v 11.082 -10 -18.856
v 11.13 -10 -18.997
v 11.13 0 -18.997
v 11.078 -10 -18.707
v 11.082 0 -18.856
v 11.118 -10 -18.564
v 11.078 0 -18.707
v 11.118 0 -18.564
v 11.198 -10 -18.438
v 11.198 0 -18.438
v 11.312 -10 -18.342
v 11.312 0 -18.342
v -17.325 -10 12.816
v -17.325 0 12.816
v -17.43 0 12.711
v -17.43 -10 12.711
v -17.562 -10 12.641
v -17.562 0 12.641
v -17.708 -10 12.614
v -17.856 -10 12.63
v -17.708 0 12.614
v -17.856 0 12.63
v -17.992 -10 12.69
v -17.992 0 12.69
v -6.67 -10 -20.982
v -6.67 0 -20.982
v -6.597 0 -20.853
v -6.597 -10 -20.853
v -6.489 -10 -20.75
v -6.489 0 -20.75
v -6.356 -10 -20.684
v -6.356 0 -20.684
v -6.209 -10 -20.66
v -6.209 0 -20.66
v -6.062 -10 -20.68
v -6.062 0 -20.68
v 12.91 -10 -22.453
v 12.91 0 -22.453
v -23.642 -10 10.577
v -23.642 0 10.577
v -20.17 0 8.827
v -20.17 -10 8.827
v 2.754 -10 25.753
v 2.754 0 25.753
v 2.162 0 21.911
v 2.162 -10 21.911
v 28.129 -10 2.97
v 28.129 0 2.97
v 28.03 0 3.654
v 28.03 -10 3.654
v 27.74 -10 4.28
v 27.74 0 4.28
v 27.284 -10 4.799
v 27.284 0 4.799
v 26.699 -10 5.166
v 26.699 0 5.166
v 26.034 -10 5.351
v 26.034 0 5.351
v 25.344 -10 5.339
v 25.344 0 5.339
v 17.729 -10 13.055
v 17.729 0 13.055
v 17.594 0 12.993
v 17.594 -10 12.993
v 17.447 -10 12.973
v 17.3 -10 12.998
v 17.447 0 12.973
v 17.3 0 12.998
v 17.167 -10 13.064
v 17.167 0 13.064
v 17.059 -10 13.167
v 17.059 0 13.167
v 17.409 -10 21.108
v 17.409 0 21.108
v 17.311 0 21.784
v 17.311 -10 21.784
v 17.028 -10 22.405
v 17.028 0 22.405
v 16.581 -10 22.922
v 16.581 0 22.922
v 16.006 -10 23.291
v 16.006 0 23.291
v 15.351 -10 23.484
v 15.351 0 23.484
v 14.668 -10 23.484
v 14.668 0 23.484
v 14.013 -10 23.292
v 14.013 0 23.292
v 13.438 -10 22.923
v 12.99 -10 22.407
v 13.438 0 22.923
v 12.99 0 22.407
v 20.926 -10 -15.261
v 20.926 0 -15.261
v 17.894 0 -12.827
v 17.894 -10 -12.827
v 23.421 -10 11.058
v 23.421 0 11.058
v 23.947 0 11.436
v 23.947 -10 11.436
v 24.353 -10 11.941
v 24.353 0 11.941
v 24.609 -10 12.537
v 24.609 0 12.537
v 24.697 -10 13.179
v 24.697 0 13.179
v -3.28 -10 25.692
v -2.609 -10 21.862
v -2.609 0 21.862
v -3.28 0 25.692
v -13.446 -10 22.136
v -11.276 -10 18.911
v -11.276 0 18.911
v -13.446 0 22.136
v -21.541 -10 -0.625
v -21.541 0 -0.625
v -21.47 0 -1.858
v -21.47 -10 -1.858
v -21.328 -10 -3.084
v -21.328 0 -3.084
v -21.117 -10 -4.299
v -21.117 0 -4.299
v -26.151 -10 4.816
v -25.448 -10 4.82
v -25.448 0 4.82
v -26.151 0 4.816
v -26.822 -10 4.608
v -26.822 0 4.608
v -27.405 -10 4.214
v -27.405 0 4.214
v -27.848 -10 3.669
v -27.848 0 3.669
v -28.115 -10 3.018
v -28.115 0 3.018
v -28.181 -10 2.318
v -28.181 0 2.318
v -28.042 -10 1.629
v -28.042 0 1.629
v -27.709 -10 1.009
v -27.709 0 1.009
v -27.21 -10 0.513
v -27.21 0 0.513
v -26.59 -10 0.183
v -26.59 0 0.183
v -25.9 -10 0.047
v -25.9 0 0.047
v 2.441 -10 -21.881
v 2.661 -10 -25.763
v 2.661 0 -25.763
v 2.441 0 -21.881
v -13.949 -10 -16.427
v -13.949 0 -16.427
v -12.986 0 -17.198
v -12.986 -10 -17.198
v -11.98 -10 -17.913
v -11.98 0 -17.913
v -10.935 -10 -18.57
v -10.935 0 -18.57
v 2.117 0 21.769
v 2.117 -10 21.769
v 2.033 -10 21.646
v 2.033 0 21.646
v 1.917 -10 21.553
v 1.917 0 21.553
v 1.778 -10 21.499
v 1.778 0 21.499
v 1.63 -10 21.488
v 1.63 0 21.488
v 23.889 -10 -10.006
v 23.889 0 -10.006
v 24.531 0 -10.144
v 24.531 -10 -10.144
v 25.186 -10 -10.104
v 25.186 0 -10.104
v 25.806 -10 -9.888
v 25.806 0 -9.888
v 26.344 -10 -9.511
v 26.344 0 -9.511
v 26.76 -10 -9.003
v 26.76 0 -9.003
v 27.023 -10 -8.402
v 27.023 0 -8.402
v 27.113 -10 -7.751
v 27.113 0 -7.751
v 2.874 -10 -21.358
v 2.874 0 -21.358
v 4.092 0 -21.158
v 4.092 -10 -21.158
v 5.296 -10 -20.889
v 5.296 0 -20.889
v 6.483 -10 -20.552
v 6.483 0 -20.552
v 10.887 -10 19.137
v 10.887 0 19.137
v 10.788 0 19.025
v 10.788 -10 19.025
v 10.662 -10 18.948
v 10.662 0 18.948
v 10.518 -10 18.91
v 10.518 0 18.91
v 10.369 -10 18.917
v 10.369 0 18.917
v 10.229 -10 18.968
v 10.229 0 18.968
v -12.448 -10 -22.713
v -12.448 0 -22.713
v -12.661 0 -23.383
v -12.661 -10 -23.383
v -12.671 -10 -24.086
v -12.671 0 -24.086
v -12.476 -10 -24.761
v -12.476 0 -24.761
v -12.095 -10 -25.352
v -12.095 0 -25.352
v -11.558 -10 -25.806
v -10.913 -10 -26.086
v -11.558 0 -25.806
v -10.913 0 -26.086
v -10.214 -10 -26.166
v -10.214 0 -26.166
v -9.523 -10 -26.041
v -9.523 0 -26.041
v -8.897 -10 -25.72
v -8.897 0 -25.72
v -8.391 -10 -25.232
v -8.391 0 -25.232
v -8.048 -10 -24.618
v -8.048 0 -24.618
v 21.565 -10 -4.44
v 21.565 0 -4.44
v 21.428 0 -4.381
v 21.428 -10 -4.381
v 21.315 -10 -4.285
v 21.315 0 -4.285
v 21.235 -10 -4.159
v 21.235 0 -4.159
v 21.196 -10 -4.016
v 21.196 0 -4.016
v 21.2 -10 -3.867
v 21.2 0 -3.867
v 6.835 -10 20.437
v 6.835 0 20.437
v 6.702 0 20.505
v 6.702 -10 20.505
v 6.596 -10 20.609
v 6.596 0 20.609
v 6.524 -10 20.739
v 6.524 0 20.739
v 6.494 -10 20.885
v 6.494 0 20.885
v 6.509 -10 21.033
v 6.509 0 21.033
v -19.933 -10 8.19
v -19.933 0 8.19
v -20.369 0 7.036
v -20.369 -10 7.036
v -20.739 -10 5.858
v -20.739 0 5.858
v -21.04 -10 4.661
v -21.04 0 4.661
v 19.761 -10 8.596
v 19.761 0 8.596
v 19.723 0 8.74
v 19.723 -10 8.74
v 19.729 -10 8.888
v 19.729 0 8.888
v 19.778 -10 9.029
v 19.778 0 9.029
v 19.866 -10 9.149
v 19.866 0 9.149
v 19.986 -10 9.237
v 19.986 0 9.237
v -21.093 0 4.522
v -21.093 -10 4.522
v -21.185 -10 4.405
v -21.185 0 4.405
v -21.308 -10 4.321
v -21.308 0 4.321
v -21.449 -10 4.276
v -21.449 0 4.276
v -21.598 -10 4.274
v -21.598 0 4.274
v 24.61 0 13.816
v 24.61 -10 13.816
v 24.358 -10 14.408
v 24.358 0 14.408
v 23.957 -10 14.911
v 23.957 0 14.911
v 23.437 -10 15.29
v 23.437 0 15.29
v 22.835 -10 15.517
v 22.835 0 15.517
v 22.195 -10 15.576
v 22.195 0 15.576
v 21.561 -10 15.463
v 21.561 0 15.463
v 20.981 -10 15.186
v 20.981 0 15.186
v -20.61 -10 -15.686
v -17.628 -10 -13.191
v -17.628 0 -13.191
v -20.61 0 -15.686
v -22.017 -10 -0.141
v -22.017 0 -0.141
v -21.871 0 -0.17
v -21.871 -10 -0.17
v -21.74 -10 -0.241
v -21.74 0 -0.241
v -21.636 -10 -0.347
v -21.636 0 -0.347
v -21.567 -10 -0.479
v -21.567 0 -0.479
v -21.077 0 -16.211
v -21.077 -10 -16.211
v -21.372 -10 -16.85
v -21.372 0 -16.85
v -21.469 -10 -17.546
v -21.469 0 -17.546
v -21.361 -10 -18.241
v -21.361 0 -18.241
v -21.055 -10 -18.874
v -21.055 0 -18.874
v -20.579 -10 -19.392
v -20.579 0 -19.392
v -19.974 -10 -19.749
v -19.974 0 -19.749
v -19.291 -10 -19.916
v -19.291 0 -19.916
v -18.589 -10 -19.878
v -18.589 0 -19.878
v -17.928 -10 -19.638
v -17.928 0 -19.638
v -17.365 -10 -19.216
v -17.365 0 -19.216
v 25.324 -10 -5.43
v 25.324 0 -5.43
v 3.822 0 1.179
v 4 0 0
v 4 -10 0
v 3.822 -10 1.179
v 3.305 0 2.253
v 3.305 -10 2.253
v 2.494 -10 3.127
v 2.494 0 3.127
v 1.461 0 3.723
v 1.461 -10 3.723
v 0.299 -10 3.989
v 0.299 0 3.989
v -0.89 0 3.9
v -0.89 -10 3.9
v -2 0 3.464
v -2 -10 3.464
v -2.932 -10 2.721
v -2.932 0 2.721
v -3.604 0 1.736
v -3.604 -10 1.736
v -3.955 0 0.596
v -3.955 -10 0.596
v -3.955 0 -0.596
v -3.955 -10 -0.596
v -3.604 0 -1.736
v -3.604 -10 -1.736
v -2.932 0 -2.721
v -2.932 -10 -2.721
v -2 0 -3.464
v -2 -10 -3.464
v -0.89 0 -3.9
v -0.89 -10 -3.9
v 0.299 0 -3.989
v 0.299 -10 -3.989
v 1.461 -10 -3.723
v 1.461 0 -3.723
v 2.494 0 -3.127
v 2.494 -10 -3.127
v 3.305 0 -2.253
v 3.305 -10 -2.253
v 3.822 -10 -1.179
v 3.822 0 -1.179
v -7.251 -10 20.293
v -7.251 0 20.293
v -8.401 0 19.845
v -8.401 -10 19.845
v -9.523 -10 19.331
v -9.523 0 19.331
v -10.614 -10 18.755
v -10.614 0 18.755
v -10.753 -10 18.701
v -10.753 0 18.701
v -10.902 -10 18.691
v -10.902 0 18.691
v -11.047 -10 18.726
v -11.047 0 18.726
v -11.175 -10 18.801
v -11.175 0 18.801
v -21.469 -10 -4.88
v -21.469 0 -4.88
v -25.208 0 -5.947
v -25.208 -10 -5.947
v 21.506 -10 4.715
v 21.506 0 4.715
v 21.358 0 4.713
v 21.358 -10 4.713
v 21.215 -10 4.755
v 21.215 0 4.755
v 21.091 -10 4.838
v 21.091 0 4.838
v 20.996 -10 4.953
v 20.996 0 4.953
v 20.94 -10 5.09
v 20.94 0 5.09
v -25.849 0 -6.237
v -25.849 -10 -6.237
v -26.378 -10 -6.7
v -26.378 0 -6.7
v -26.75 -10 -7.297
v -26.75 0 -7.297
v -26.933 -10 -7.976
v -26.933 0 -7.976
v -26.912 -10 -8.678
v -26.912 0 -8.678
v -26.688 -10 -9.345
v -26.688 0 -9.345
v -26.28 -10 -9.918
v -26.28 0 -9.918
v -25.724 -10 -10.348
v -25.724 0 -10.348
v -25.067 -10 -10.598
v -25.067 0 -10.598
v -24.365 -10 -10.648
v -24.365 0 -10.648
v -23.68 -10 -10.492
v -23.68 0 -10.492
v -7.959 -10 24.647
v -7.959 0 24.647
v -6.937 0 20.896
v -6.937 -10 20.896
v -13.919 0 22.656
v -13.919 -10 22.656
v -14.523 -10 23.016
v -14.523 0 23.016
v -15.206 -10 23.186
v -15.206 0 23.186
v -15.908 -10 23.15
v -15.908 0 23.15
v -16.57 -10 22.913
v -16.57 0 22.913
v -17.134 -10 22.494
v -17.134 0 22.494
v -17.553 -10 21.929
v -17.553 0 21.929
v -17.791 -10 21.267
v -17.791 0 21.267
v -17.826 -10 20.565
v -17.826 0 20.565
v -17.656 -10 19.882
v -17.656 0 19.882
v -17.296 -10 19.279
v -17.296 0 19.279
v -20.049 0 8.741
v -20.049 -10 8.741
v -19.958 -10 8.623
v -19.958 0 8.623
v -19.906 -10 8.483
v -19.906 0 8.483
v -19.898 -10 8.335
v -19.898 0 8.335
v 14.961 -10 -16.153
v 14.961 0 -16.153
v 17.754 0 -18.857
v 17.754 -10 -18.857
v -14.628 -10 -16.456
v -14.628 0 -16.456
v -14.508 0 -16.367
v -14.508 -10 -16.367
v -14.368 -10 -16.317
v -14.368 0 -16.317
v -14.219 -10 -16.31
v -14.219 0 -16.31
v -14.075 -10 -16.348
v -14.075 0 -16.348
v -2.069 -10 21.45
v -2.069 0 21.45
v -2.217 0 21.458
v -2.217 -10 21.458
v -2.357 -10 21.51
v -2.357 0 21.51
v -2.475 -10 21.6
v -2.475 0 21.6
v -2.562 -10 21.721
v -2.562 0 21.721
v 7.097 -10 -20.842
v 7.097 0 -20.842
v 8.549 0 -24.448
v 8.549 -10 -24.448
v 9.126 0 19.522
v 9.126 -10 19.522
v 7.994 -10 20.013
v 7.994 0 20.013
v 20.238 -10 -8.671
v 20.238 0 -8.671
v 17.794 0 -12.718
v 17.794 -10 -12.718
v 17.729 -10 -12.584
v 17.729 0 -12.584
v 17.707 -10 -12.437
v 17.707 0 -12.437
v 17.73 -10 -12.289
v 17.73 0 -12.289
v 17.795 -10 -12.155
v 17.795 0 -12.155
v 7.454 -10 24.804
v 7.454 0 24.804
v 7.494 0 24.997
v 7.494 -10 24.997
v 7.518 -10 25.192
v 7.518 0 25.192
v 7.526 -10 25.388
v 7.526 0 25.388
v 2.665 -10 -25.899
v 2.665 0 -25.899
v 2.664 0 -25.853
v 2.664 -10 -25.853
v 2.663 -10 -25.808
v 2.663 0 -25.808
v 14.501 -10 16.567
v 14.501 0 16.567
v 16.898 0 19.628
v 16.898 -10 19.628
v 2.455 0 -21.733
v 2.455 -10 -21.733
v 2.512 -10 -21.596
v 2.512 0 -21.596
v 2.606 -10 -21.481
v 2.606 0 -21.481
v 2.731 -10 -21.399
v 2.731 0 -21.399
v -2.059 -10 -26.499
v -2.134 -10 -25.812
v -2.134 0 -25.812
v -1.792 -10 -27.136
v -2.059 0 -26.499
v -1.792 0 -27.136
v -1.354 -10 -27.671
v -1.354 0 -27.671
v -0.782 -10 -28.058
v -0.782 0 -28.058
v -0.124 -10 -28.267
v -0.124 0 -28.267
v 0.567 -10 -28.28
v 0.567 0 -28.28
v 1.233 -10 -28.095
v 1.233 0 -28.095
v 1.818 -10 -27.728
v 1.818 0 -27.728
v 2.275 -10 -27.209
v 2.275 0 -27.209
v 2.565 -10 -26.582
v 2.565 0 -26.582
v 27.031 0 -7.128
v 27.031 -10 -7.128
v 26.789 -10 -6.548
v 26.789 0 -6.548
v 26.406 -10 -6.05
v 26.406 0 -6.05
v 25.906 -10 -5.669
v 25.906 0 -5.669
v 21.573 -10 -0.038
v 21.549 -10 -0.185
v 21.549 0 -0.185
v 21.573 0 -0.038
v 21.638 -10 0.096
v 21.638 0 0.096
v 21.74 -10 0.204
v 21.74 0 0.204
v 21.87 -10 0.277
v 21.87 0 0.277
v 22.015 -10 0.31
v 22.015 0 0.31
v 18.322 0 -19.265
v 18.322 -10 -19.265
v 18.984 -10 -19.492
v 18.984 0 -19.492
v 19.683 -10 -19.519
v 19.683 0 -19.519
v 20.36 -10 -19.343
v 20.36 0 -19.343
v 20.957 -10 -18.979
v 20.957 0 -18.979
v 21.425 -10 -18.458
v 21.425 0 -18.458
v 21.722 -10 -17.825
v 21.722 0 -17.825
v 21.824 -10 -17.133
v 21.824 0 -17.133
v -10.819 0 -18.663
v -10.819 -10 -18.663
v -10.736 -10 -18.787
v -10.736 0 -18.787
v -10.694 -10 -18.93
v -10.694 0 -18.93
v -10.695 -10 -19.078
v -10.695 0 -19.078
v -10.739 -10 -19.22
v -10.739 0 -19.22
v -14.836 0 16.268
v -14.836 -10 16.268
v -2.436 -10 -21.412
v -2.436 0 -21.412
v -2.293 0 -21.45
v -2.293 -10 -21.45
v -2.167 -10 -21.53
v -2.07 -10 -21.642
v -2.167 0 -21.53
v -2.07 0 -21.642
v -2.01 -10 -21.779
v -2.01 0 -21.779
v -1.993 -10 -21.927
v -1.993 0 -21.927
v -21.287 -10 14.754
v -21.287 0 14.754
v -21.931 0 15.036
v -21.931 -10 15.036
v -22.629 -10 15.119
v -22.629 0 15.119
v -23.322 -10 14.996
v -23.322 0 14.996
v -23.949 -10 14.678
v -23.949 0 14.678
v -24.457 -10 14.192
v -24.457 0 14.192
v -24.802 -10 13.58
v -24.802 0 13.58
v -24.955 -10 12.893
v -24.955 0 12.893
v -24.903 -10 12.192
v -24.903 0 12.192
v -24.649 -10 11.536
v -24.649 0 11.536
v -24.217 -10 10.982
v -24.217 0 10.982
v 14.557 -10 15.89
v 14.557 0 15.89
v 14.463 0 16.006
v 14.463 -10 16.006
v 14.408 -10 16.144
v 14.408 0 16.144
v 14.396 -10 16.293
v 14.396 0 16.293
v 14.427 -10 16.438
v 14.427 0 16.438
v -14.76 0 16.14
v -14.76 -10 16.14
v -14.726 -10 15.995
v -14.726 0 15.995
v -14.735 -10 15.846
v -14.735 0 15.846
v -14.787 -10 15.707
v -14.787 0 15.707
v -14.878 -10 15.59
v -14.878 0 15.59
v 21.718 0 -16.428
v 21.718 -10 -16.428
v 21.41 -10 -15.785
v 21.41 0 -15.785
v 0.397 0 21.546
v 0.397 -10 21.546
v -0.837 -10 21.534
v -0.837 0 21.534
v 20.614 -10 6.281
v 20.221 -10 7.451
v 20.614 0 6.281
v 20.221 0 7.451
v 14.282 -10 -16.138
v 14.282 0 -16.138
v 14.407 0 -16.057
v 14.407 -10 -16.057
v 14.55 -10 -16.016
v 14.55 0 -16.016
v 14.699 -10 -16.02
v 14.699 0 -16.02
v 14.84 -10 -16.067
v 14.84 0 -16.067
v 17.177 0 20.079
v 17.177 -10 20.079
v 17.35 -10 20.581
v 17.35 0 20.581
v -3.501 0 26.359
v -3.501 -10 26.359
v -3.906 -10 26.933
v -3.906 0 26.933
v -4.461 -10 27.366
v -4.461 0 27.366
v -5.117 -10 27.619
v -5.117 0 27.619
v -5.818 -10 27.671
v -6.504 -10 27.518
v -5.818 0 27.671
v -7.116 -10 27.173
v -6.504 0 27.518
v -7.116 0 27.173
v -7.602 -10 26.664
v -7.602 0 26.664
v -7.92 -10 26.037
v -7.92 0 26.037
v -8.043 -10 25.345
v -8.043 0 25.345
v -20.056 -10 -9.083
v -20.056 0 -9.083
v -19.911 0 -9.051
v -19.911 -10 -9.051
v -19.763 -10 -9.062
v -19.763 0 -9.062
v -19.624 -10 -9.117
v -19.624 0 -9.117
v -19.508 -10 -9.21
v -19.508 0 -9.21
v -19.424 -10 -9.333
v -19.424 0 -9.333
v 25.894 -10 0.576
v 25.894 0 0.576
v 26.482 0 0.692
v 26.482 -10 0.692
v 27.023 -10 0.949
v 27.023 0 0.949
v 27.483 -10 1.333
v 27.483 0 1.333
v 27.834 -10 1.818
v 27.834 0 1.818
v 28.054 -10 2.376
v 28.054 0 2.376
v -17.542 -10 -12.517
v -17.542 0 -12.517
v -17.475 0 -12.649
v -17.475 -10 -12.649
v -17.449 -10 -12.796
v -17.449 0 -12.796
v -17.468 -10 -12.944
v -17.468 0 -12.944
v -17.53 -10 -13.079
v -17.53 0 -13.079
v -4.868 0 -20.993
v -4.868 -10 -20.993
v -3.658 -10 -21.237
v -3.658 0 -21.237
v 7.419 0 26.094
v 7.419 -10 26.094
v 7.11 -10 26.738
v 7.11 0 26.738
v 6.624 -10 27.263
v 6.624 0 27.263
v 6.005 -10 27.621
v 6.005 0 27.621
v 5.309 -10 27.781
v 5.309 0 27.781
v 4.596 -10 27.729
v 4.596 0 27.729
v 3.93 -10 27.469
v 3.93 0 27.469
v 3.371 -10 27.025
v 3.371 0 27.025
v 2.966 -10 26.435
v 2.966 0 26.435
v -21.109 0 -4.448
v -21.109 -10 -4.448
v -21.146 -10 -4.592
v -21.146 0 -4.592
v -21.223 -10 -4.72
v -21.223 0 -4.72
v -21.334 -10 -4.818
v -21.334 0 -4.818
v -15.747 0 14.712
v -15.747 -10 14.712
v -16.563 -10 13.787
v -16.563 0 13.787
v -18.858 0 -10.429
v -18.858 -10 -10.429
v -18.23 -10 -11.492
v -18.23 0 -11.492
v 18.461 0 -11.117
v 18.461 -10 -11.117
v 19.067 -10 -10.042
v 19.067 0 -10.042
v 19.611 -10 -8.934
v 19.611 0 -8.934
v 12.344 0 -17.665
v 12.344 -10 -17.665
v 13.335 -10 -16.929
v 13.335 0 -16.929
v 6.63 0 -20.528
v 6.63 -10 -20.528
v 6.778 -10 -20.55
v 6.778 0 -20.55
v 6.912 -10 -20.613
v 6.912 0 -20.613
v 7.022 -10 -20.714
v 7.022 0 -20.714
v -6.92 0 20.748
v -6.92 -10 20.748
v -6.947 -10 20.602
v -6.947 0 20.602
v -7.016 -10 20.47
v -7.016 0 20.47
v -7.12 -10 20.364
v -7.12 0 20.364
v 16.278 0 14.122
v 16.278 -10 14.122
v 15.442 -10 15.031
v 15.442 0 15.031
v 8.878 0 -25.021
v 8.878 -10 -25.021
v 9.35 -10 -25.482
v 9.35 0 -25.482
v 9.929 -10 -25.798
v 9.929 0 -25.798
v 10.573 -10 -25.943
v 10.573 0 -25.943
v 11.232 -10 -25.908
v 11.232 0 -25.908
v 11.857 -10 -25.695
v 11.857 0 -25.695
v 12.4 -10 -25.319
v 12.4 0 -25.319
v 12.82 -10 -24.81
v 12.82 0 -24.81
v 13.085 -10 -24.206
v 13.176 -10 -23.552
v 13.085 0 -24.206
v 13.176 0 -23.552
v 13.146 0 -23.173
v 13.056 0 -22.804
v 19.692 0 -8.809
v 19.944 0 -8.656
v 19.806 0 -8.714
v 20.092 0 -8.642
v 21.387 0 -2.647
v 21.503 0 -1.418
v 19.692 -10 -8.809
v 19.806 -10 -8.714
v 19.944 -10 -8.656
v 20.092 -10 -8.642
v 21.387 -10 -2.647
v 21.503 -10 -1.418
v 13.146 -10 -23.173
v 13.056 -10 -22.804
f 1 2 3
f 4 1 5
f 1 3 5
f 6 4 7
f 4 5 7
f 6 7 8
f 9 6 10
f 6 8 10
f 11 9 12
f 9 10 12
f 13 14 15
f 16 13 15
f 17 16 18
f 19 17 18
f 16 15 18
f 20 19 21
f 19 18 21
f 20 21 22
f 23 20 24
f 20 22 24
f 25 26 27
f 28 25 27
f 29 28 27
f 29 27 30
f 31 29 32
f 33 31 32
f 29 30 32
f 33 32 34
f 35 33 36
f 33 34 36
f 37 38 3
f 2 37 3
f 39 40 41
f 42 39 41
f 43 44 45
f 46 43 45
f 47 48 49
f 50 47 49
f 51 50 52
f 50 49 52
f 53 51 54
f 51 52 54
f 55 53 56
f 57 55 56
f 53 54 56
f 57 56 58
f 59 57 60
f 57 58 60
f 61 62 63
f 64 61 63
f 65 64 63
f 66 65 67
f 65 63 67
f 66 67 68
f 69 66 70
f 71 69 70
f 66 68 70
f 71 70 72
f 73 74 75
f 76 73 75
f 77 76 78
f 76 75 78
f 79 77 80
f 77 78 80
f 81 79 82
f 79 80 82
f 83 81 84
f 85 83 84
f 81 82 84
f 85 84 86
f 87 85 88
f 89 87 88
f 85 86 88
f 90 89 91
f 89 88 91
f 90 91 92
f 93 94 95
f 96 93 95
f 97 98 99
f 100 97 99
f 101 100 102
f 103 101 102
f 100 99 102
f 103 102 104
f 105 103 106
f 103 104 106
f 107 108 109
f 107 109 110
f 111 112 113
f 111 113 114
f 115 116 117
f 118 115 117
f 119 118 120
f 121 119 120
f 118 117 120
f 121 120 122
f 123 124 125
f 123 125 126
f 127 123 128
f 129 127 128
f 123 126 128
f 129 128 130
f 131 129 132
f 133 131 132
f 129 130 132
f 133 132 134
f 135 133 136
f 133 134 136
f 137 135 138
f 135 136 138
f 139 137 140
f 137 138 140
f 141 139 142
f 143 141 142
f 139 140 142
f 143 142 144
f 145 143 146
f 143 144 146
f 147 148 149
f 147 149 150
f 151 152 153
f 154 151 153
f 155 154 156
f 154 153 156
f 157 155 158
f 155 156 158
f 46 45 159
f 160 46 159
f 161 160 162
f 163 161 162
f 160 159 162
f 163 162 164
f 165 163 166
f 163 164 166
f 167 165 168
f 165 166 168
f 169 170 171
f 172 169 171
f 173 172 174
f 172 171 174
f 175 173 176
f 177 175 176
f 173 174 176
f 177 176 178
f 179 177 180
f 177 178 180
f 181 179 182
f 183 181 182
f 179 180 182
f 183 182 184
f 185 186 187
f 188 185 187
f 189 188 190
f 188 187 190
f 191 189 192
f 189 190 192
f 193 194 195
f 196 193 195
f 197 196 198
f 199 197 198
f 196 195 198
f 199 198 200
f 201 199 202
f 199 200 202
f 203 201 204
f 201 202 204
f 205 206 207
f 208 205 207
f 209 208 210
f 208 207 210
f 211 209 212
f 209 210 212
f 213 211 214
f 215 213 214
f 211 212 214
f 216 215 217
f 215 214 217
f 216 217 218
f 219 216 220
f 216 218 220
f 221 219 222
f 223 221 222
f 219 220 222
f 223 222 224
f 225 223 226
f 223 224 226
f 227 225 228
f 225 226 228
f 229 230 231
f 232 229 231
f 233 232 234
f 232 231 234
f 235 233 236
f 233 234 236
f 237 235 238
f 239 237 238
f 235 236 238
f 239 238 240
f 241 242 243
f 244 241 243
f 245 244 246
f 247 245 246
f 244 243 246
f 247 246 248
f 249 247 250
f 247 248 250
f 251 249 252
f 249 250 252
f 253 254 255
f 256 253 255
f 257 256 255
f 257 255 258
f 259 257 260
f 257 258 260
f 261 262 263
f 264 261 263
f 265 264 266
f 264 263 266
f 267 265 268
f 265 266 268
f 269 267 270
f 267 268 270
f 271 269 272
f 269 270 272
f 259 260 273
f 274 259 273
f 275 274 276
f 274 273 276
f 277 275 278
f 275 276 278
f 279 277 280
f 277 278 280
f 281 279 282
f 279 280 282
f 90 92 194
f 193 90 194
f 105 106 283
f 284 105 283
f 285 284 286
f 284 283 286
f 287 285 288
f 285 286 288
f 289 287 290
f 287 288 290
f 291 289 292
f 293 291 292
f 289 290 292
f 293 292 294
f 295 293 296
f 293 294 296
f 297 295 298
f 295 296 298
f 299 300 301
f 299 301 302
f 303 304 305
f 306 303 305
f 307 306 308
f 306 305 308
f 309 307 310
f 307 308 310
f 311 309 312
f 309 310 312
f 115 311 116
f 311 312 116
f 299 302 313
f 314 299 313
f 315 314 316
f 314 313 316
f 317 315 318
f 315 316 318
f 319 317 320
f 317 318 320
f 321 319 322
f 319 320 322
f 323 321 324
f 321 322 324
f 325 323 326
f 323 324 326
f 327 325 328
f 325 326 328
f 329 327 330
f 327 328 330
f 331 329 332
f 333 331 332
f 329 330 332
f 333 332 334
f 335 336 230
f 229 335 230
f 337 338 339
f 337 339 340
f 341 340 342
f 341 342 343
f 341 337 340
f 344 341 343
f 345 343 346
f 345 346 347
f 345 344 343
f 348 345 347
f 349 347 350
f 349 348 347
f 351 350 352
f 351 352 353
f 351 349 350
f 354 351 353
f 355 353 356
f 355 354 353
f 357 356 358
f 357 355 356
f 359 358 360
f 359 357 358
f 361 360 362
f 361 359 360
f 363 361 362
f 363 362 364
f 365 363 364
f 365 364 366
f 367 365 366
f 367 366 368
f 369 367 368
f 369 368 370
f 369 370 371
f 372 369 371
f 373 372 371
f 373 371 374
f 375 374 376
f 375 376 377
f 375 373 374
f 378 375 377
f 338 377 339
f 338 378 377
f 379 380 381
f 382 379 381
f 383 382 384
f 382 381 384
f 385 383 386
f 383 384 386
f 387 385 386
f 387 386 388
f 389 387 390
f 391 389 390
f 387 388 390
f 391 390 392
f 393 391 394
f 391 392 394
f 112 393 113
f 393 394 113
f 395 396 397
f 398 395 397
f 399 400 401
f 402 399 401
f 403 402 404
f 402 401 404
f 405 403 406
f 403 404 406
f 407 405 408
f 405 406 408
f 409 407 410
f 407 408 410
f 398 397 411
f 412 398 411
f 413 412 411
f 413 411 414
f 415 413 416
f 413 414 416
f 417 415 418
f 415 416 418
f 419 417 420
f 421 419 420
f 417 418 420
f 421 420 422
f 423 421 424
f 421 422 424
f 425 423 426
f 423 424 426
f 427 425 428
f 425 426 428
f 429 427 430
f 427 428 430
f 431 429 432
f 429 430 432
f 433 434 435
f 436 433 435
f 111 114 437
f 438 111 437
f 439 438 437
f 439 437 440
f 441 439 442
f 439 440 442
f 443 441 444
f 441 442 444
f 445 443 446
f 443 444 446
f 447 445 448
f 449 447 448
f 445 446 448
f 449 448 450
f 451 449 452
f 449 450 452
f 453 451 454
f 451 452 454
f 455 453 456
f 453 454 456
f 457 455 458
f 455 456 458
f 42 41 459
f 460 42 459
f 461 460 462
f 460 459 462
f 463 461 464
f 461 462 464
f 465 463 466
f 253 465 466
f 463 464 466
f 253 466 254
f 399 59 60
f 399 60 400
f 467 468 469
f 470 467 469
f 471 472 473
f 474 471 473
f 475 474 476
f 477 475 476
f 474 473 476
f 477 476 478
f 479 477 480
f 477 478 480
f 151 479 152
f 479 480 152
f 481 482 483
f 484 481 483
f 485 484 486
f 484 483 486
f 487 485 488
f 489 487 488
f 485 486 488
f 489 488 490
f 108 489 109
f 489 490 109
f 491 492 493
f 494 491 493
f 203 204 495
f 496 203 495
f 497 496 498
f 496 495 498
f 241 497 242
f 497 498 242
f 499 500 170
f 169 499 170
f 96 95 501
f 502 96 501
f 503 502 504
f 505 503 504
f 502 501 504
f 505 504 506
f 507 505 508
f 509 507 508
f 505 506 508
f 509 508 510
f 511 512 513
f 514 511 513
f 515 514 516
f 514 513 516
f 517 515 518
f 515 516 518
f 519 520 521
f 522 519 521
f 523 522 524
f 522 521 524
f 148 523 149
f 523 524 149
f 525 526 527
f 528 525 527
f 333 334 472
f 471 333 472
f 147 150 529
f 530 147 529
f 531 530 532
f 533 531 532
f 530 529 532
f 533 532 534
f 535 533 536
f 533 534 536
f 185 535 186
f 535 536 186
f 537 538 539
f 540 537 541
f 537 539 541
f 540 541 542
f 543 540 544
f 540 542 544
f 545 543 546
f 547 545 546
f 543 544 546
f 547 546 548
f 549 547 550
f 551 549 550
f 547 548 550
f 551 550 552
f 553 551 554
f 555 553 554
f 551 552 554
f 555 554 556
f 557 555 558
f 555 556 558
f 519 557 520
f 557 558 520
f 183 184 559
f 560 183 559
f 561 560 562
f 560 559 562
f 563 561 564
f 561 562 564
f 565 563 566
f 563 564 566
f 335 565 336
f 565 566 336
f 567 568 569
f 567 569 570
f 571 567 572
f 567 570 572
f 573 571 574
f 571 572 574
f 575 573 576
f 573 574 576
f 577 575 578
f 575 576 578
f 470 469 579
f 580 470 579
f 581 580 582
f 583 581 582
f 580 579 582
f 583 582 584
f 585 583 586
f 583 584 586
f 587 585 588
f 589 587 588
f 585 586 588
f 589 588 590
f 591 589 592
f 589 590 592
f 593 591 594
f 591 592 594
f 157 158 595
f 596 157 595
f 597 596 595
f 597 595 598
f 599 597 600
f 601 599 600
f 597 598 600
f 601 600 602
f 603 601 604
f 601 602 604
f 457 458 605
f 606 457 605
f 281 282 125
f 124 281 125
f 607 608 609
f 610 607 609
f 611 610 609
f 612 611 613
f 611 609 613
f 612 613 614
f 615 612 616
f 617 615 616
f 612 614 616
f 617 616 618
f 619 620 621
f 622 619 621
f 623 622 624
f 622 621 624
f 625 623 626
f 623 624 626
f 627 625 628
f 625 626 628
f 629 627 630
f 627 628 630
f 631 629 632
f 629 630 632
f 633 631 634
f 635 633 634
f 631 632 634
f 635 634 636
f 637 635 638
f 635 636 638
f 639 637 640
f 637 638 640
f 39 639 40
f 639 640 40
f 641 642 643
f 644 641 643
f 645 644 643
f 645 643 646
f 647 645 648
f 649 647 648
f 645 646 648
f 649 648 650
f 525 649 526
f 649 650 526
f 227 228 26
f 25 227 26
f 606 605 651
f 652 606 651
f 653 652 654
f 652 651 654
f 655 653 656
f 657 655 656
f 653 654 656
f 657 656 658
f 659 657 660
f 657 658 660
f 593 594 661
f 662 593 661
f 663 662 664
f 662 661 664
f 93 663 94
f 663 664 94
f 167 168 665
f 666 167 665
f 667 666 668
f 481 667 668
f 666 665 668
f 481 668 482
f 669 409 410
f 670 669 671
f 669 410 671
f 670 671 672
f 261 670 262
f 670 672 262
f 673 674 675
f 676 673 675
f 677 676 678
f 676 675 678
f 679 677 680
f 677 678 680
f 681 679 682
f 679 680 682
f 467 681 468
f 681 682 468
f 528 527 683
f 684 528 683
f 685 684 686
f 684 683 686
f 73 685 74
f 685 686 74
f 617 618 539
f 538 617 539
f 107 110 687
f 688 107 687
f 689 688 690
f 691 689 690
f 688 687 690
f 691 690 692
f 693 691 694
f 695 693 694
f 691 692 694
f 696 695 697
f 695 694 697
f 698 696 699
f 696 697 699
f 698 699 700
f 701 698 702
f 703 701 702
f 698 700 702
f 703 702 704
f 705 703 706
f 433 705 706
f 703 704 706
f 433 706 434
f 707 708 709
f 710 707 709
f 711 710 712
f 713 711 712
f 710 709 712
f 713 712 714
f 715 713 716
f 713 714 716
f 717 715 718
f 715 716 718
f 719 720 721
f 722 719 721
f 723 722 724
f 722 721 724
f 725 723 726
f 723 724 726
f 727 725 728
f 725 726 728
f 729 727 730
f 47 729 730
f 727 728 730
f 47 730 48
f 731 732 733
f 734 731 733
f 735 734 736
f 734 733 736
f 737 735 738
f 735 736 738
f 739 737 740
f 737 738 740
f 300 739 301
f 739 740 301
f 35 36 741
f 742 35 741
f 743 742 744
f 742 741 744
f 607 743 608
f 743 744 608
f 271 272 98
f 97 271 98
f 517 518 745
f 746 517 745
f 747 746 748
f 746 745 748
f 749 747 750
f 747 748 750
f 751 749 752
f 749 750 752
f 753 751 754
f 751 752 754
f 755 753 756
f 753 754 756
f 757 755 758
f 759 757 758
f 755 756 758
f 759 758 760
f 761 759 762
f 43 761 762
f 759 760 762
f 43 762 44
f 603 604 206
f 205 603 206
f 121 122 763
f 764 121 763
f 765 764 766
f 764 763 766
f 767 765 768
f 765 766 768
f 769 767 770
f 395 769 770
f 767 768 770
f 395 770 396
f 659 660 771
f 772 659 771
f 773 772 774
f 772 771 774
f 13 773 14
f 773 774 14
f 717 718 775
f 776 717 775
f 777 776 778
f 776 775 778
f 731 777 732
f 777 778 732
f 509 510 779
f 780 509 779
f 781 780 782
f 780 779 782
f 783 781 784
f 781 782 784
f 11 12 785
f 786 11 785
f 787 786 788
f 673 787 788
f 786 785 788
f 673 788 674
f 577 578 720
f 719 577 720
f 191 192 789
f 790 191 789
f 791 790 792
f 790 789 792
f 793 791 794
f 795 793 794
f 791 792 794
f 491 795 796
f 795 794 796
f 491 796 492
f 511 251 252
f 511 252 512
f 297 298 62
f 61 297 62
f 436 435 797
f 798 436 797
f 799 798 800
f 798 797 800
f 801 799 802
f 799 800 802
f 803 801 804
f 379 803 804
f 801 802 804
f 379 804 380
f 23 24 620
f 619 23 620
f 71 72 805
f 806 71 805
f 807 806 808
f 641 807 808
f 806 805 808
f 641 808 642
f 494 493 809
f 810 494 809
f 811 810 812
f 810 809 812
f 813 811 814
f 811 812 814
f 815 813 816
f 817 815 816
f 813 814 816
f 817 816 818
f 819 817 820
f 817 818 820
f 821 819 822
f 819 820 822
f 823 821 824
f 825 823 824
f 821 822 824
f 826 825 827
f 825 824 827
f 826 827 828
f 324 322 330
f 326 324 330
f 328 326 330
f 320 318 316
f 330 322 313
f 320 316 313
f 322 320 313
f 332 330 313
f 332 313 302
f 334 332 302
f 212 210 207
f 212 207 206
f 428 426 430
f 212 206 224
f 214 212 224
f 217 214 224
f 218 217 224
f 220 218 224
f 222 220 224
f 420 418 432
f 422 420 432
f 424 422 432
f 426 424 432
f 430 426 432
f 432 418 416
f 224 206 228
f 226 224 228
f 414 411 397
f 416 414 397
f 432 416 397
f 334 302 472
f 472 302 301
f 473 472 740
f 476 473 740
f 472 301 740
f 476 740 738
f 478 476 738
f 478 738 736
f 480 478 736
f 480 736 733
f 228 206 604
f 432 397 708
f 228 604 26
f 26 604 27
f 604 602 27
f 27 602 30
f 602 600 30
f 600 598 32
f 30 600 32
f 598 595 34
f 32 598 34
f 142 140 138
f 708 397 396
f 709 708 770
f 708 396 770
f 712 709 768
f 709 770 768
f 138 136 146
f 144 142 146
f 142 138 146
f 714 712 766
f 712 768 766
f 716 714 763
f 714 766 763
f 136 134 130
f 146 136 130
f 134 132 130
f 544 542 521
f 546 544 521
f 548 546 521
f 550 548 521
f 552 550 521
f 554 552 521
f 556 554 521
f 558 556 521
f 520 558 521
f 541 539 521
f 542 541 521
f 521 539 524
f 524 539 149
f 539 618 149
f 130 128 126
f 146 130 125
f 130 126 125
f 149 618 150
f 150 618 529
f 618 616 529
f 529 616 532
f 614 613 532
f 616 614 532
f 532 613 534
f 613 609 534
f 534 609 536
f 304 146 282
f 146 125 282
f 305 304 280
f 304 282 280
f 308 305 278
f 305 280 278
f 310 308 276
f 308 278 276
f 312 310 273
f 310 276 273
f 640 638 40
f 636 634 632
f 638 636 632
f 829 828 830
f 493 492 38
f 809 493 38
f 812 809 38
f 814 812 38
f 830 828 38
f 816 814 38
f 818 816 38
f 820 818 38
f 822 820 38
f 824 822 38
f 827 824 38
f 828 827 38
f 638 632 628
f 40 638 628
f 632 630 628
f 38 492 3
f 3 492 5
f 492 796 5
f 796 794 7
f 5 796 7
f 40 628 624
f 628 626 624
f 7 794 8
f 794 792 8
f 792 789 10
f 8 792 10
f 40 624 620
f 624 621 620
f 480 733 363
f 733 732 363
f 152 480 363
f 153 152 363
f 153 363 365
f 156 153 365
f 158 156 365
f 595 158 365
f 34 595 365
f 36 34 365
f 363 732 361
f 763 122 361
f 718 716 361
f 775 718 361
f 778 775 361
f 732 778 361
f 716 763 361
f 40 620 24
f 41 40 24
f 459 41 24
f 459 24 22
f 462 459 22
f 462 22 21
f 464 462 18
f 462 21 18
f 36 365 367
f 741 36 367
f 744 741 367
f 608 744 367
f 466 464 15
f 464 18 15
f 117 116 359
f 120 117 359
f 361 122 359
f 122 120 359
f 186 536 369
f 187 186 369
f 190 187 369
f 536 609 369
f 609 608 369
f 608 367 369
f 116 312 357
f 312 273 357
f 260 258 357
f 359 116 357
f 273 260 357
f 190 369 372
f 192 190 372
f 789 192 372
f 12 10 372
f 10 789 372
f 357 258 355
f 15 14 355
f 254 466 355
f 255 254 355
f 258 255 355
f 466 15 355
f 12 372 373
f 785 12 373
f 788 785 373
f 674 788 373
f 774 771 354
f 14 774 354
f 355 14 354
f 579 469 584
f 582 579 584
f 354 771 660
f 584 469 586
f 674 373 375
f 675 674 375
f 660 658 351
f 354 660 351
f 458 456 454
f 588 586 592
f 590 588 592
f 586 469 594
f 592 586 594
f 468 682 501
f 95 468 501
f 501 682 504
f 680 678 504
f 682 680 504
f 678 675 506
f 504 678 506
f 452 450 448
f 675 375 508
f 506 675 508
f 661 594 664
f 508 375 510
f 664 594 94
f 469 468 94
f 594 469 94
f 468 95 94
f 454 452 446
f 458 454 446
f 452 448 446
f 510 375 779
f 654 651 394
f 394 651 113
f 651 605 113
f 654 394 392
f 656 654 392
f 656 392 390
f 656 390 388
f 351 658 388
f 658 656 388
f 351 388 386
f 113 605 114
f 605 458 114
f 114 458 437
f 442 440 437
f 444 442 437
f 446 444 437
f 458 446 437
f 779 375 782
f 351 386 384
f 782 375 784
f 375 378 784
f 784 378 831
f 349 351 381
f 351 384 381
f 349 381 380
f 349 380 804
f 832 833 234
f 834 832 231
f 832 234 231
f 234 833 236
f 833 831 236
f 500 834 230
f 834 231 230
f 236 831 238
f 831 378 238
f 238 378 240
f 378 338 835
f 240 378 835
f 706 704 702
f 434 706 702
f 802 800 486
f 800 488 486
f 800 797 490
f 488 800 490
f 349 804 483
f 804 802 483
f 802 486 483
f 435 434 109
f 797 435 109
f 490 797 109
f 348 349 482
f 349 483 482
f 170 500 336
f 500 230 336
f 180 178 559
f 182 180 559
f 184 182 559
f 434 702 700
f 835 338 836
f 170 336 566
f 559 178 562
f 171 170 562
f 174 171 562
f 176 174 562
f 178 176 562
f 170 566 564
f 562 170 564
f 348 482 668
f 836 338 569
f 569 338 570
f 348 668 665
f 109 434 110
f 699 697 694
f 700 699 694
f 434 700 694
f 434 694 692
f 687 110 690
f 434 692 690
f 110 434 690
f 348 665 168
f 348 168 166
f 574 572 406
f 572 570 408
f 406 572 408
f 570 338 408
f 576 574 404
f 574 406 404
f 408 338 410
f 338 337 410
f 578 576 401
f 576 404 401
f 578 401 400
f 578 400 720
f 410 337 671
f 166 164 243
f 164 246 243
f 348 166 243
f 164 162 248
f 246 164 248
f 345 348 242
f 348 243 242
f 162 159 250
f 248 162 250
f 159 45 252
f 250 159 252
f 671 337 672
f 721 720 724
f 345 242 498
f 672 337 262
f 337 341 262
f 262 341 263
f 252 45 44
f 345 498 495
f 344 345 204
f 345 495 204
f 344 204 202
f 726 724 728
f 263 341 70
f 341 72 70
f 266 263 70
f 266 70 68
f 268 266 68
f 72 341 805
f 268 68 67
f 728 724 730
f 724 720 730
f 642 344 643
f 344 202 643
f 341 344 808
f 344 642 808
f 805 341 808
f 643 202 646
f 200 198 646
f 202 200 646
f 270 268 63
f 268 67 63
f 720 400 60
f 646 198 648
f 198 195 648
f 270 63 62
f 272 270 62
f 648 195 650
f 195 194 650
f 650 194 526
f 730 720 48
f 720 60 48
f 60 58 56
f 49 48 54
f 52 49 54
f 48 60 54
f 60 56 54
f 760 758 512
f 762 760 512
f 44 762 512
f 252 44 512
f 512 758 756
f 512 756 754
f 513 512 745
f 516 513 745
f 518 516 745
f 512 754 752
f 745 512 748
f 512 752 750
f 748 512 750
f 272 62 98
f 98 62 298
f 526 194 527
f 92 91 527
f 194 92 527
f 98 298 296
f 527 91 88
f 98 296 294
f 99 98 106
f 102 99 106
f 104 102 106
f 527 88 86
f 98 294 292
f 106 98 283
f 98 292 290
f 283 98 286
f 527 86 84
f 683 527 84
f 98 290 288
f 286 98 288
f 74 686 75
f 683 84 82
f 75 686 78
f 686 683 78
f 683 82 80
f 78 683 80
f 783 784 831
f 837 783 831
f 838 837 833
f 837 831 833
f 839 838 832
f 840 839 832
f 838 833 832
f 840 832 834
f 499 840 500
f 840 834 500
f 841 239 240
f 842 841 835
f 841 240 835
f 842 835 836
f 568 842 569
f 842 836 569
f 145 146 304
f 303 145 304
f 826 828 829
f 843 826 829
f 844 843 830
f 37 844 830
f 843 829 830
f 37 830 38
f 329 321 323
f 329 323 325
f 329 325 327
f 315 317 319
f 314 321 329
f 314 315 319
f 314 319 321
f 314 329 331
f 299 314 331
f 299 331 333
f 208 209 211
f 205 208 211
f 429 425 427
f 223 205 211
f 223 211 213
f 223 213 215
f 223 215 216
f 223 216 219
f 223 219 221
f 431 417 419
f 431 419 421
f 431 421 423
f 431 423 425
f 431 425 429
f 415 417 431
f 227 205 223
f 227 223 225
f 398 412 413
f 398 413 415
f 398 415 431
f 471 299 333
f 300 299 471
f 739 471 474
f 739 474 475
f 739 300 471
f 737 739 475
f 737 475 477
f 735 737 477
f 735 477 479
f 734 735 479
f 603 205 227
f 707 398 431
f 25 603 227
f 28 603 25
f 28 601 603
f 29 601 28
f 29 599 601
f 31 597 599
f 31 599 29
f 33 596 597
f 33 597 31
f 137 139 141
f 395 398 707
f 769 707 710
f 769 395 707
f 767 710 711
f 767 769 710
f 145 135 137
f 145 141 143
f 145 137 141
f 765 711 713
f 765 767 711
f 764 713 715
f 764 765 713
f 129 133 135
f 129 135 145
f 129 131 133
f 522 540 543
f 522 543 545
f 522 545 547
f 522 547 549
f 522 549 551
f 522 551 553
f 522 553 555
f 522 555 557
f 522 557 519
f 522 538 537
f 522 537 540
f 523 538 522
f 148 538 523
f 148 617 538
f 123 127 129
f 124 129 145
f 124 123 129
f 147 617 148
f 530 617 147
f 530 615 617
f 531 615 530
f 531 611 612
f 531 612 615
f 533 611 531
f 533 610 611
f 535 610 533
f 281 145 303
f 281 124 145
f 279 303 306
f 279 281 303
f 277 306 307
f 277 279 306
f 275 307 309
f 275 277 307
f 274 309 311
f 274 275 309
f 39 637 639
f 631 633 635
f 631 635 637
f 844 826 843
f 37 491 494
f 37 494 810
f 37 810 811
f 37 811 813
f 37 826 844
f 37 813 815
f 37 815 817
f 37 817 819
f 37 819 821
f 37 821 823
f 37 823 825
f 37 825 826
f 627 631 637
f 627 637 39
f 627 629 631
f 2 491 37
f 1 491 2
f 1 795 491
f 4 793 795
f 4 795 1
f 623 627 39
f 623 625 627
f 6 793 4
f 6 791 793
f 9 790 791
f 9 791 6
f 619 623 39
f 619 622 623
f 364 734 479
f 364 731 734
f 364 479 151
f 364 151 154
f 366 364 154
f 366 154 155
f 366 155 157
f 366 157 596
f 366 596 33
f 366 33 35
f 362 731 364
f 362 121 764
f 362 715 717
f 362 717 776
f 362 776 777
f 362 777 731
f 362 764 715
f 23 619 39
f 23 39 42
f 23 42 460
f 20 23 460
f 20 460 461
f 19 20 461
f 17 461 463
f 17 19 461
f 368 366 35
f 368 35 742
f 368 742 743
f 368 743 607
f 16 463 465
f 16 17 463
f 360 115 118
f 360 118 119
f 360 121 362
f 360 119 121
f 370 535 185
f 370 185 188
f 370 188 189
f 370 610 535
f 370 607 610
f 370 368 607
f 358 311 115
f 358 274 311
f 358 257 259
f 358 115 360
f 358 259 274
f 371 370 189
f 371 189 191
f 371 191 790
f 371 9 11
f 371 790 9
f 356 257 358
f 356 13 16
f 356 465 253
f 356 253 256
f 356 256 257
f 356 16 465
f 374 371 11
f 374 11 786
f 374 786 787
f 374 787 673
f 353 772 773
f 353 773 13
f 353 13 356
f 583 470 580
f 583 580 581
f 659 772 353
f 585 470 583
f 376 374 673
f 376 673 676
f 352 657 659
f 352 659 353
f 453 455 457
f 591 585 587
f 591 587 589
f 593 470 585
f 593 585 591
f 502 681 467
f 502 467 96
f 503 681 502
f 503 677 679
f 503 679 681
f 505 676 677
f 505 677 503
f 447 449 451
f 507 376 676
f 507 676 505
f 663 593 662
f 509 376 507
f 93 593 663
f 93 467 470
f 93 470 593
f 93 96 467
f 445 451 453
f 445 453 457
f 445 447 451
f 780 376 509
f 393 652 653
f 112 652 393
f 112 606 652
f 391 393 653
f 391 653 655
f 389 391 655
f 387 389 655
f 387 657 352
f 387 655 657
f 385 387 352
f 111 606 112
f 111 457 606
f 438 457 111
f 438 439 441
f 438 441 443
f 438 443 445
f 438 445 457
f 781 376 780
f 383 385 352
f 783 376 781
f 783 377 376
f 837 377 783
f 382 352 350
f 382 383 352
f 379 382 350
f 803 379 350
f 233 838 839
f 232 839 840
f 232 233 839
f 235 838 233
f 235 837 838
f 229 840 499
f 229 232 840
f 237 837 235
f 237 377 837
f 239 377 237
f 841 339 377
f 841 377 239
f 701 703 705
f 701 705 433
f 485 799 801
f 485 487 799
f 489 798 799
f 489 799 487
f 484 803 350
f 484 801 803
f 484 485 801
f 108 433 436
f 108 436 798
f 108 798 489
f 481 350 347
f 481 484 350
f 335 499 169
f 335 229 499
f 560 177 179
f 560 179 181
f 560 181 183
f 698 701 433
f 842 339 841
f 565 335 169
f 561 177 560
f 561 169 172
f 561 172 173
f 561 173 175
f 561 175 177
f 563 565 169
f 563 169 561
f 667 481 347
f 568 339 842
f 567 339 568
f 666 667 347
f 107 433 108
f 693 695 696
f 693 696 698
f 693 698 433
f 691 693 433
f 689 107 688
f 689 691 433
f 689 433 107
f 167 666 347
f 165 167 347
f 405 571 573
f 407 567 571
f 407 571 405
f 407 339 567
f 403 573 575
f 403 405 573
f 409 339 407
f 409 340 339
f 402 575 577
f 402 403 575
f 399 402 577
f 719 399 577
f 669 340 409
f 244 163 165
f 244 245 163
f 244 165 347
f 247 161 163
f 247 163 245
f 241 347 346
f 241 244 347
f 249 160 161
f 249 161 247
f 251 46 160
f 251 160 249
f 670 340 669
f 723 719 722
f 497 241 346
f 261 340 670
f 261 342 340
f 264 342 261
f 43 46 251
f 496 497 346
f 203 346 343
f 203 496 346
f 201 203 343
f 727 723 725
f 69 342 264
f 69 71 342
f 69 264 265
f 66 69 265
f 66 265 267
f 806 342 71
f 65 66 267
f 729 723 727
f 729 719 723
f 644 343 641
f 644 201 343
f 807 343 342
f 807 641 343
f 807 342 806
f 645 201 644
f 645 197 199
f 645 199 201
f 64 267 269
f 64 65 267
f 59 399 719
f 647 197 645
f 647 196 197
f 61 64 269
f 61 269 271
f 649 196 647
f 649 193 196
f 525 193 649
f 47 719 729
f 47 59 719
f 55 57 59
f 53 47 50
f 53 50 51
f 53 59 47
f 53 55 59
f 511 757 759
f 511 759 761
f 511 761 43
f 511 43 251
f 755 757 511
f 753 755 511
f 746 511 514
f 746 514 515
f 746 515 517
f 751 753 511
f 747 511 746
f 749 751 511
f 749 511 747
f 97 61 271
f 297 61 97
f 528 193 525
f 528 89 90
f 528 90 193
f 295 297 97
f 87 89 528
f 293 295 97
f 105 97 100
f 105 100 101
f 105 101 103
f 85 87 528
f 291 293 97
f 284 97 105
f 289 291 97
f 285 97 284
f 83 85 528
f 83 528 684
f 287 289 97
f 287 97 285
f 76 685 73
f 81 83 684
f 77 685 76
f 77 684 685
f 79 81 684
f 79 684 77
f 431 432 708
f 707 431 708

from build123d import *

# Parameters (mm, degrees)
F0_R     = 4
F1_DEPTH = 10


with BuildPart() as f1:
    # F0 (on Front) → F1 (new body)
    with BuildSketch(Plane.XZ):
        with BuildLine():
            ThreePointArc((21.549207, -0.184903), (21.549802, -0.092452), (21.55, 0))
            ThreePointArc((21.55, 0), (21.397, 2.563379), (20.940171, 5.090358))
            ThreePointArc((20.940171, 5.090358), (20.426122, 6.868482), (19.761387, 8.595935))
            ThreePointArc((19.761387, 8.595935), (18.551725, 10.965218), (17.059363, 13.167408))
            ThreePointArc((17.059363, 13.167408), (15.866528, 14.582722), (14.556643, 15.890457))
            ThreePointArc((14.556643, 15.890457), (12.487888, 17.562892), (10.228836, 18.967694))
            ThreePointArc((10.228836, 18.967694), (8.563467, 19.775478), (6.834924, 20.437375))
            ThreePointArc((6.834924, 20.437375), (4.264781, 21.123781), (1.62965, 21.488293))
            ThreePointArc((1.62965, 21.488293), (-0.220295, 21.548874), (-2.068616, 21.450486))
            ThreePointArc((-2.068616, 21.450486), (-4.695744, 21.032177), (-7.251317, 20.293371))
            ThreePointArc((-7.251317, 20.293371), (-8.965966, 19.596274), (-10.614473, 18.754612))
            ThreePointArc((-10.614473, 18.754612), (-12.844333, 17.303919), (-14.878465, 15.589541))
            ThreePointArc((-14.878465, 15.589541), (-16.161341, 14.2553), (-17.324991, 12.815895))
            ThreePointArc((-17.324991, 12.815895), (-18.77202, 10.583656), (-19.932992, 8.190137))
            ThreePointArc((-19.932992, 8.190137), (-20.562272, 6.449455), (-21.039861, 4.661194))
            ThreePointArc((-21.039861, 4.661194), (-21.453854, 2.033382), (-21.540923, -0.625415))
            ThreePointArc((-21.540923, -0.625415), (-21.4078, -2.471559), (-21.116748, -4.29947))
            ThreePointArc((-21.116748, -4.29947), (-20.426122, -6.868482), (-19.424233, -9.332828))
            ThreePointArc((-19.424233, -9.332828), (-18.551725, -10.965218), (-17.542358, -12.516717))
            ThreePointArc((-17.542358, -12.516717), (-15.866528, -14.582722), (-13.948917, -16.42651))
            ThreePointArc((-13.948917, -16.42651), (-12.487888, -17.562892), (-10.934734, -18.569709))
            ThreePointArc((-10.934734, -18.569709), (-8.563467, -19.775478), (-6.061706, -20.679899))
            ThreePointArc((-6.061706, -20.679899), (-4.264781, -21.123781), (-2.436395, -21.41183))
            ThreePointArc((-2.436395, -21.41183), (0.220295, -21.548874), (2.873629, -21.357546))
            ThreePointArc((2.873629, -21.357546), (4.695744, -21.032177), (6.483218, -20.551652))
            ThreePointArc((6.483218, -20.551652), (8.965966, -19.596274), (11.312087, -18.342279))
            ThreePointArc((11.312087, -18.342279), (12.844333, -17.303919), (14.281824, -16.137905))
            ThreePointArc((14.281824, -16.137905), (16.161341, -14.2553), (17.794583, -12.155465))
            ThreePointArc((17.794583, -12.155465), (18.77202, -10.583656), (19.610973, -8.933769))
            ThreePointArc((19.610973, -8.933769), (20.562272, -6.449455), (21.200233, -3.866861))
            ThreePointArc((21.200233, -3.866861), (21.453854, -2.033382), (21.549207, -0.184903))
        make_face()
        Circle(F0_R, mode=Mode.SUBTRACT)
        with BuildLine():
            ThreePointArc((20.940171, 5.090358), (21.397, 2.563379), (21.55, 0))
            ThreePointArc((21.55, 0), (21.549802, -0.092452), (21.549207, -0.184903))
            ThreePointArc((21.549207, -0.184903), (21.685187, 0.153594), (22.014918, 0.309631))
            Line((22.014918, 0.309631), (25.893592, 0.576103))
            ThreePointArc((25.893592, 0.576103), (23.344933, 2.695204), (25.343673, 5.339308))
            Line((25.343673, 5.339308), (21.506318, 4.714954))
            ThreePointArc((21.506318, 4.714954), (21.149705, 4.791752), (20.940171, 5.090358))
        make_face()
        with BuildLine():
            ThreePointArc((17.059363, 13.167408), (18.551725, 10.965218), (19.761387, 8.595935))
            ThreePointArc((19.761387, 8.595935), (19.747931, 8.960475), (19.98569, 9.237136))
            Line((19.98569, 9.237136), (23.420651, 11.058169))
            ThreePointArc((23.420651, 11.058169), (20.230419, 11.957431), (20.980905, 15.185902))
            Line((20.980905, 15.185902), (17.729255, 13.054732))
            ThreePointArc((17.729255, 13.054732), (17.372236, 12.979843), (17.059363, 13.167408))
        make_face()
        with BuildLine():
            ThreePointArc((21.564743, -4.440083), (21.270198, -4.224877), (21.200233, -3.866861))
            ThreePointArc((21.200233, -3.866861), (20.562272, -6.449455), (19.610973, -8.933769))
            ThreePointArc((19.610973, -8.933769), (19.872876, -8.679845), (20.237567, -8.671412))
            Line((20.237567, -8.671412), (23.889295, -10.005577))
            ThreePointArc((23.889295, -10.005577), (22.422895, -7.033048), (25.32429, -5.4305))
            Line((25.32429, -5.4305), (21.564743, -4.440083))
        make_face()
        with BuildLine():
            ThreePointArc((28.129096, 2.970459), (27.283925, 4.798711), (25.343673, 5.339308))
            ThreePointArc((25.343673, 5.339308), (23.344933, 2.695204), (25.893592, 0.576103))
            ThreePointArc((25.893592, 0.576103), (27.483347, 1.332593), (28.129096, 2.970459))
        make_face()
        with BuildLine():
            ThreePointArc((10.228836, 18.967694), (12.487888, 17.562892), (14.556643, 15.890457))
            ThreePointArc((14.556643, 15.890457), (14.396079, 16.218009), (14.500755, 16.567457))
            Line((14.500755, 16.567457), (16.898067, 19.628177))
            ThreePointArc((16.898067, 19.628177), (13.617882, 19.152109), (12.990348, 22.406715))
            Line((12.990348, 22.406715), (10.886642, 19.137229))
            ThreePointArc((10.886642, 19.137229), (10.59095, 18.923602), (10.228836, 18.967694))
        make_face()
        with BuildLine():
            ThreePointArc((20.980905, 15.185902), (20.230419, 11.957431), (23.420651, 11.058169))
            ThreePointArc((23.420651, 11.058169), (24.352952, 11.94127), (24.696504, 13.178615))
            ThreePointArc((24.696504, 13.178615), (23.437241, 15.290183), (20.980905, 15.185902))
        make_face()
        with BuildLine():
            ThreePointArc((17.894429, -12.827389), (17.71288, -12.510986), (17.794583, -12.155465))
            ThreePointArc((17.794583, -12.155465), (16.161341, -14.2553), (14.281824, -16.137905))
            ThreePointArc((14.281824, -16.137905), (14.624365, -16.01246), (14.960957, -16.153089))
            Line((14.960957, -16.153089), (17.754323, -18.857201))
            ThreePointArc((17.754323, -18.857201), (17.623736, -15.545223), (20.926107, -15.261325))
            Line((20.926107, -15.261325), (17.894429, -12.827389))
        make_face()
        with BuildLine():
            ThreePointArc((27.112893, -7.751317), (26.61386, -6.286284), (25.32429, -5.4305))
            ThreePointArc((25.32429, -5.4305), (22.422895, -7.033048), (23.889295, -10.005577))
            ThreePointArc((23.889295, -10.005577), (26.088278, -9.718121), (27.112893, -7.751317))
        make_face()
        with BuildLine():
            ThreePointArc((1.62965, 21.488293), (4.264781, 21.123781), (6.834924, 20.437375))
            ThreePointArc((6.834924, 20.437375), (6.555015, 20.671301), (6.508507, 21.033113))
            Line((6.508507, 21.033113), (7.453654, 24.804295))
            ThreePointArc((7.453654, 24.804295), (4.65069, 23.035214), (2.753642, 25.753203))
            Line((2.753642, 25.753203), (2.16163, 21.910725))
            ThreePointArc((2.16163, 21.910725), (1.978392, 21.595298), (1.62965, 21.488293))
        make_face()
        with BuildLine():
            ThreePointArc((12.990348, 22.406715), (13.617882, 19.152109), (16.898067, 19.628177))
            ThreePointArc((16.898067, 19.628177), (17.277412, 20.325322), (17.408645, 21.108069))
            ThreePointArc((17.408645, 21.108069), (15.685434, 23.410667), (12.990348, 22.406715))
        make_face()
        with BuildLine():
            ThreePointArc((11.130005, -18.996723), (11.092845, -18.633832), (11.312087, -18.342279))
            ThreePointArc((11.312087, -18.342279), (8.965966, -19.596274), (6.483218, -20.551652))
            ThreePointArc((6.483218, -20.551652), (6.847168, -20.576375), (7.097461, -20.84175))
            Line((7.097461, -20.84175), (8.549466, -24.448244))
            ThreePointArc((8.549466, -24.448244), (9.777272, -21.369486), (12.90961, -22.453329))
            Line((12.90961, -22.453329), (11.130005, -18.996723))
        make_face()
        with BuildLine():
            ThreePointArc((21.823606, -17.13282), (21.587631, -16.095034), (20.926107, -15.261325))
            ThreePointArc((20.926107, -15.261325), (17.623736, -15.545223), (17.754323, -18.857201))
            ThreePointArc((17.754323, -18.857201), (20.360014, -19.342603), (21.823606, -17.13282))
        make_face()
        with BuildLine():
            ThreePointArc((-7.251317, 20.293371), (-4.695744, 21.032177), (-2.068616, 21.450486))
            ThreePointArc((-2.068616, 21.450486), (-2.419472, 21.550338), (-2.609121, 21.861953))
            Line((-2.609121, 21.861953), (-3.279564, 25.691525))
            ThreePointArc((-3.279564, 25.691525), (-3.252615, 25.485368), (-3.243609, 25.277652))
            ThreePointArc((-3.243609, 25.277652), (-5.325336, 22.898849), (-7.959194, 24.646728))
            Line((-7.959194, 24.646728), (-6.937147, 20.895657))
            ThreePointArc((-6.937147, 20.895657), (-6.976248, 20.53297), (-7.251317, 20.293371))
        make_face()
        with BuildLine():
            ThreePointArc((2.753642, 25.753203), (4.65069, 23.035214), (7.453654, 24.804295))
            ThreePointArc((7.453654, 24.804295), (7.507586, 25.093808), (7.525654, 25.387747))
            ThreePointArc((7.525654, 25.387747), (5.308917, 27.780739), (2.753642, 25.753203))
        make_face()
        with BuildLine():
            ThreePointArc((2.441102, -21.881351), (2.554756, -21.534719), (2.873629, -21.357546))
            ThreePointArc((2.873629, -21.357546), (0.220295, -21.548874), (-2.436395, -21.41183))
            ThreePointArc((-2.436395, -21.41183), (-2.113967, -21.582448), (-1.99325, -21.926684))
            Line((-1.99325, -21.926684), (-2.133671, -25.811963))
            ThreePointArc((-2.133671, -25.811963), (0.240229, -23.498772), (2.660924, -25.762948))
            Line((2.660924, -25.762948), (2.441102, -21.881351))
        make_face()
        with BuildLine():
            ThreePointArc((13.175802, -23.551902), (13.108305, -22.98672), (12.90961, -22.453329))
            ThreePointArc((12.90961, -22.453329), (9.777272, -21.369486), (8.549466, -24.448244))
            ThreePointArc((8.549466, -24.448244), (11.232307, -25.908086), (13.175802, -23.551902))
        make_face()
        with BuildLine():
            ThreePointArc((-14.878465, 15.589541), (-12.844333, 17.303919), (-10.614473, 18.754612))
            ThreePointArc((-10.614473, 18.754612), (-10.97561, 18.703126), (-11.275608, 18.910663))
            Line((-11.275608, 18.910663), (-13.445715, 22.136457))
            ThreePointArc((-13.445715, 22.136457), (-13.141482, 21.497114), (-13.037041, 20.796821))
            ThreePointArc((-13.037041, 20.796821), (-14.631142, 18.536174), (-17.295814, 19.278611))
            Line((-17.295814, 19.278611), (-14.836429, 16.267541))
            ThreePointArc((-14.836429, 16.267541), (-14.724631, 15.920306), (-14.878465, 15.589541))
        make_face()
        with BuildLine():
            ThreePointArc((-3.243609, 25.277652), (-3.252615, 25.485368), (-3.279564, 25.691525))
            ThreePointArc((-3.279564, 25.691525), (-6.166569, 27.619982), (-7.959194, 24.646728))
            ThreePointArc((-7.959194, 24.646728), (-5.325336, 22.898849), (-3.243609, 25.277652))
        make_face()
        with BuildLine():
            ThreePointArc((-6.669889, -20.982495), (-6.425074, -20.712058), (-6.061706, -20.679899))
            ThreePointArc((-6.061706, -20.679899), (-8.563467, -19.775478), (-10.934734, -18.569709))
            ThreePointArc((-10.934734, -18.569709), (-10.709577, -18.85672), (-10.73931, -19.220294))
            Line((-10.73931, -19.220294), (-12.447877, -22.71256))
            ThreePointArc((-12.447877, -22.71256), (-9.750747, -21.429121), (-7.892055, -23.76728))
            ThreePointArc((-7.892055, -23.76728), (-7.931328, -24.199675), (-8.04786, -24.617919))
            Line((-8.04786, -24.617919), (-6.669889, -20.982495))
        make_face()
        with BuildLine():
            ThreePointArc((2.664763, -25.898647), (2.663803, -25.83077), (2.660924, -25.762948))
            ThreePointArc((2.660924, -25.762948), (0.240229, -23.498772), (-2.133671, -25.811963))
            ThreePointArc((-2.133671, -25.811963), (0.221415, -28.298255), (2.664763, -25.898647))
        make_face()
        with BuildLine():
            ThreePointArc((-19.932992, 8.190137), (-18.77202, 10.583656), (-17.324991, 12.815895))
            ThreePointArc((-17.324991, 12.815895), (-17.633965, 12.621973), (-17.99244, 12.689547))
            Line((-17.99244, 12.689547), (-21.286981, 14.753795))
            ThreePointArc((-21.286981, 14.753795), (-20.461471, 13.882295), (-20.161268, 12.720032))
            ThreePointArc((-20.161268, 12.720032), (-21.302965, 10.67634), (-23.641829, 10.577046))
            Line((-23.641829, 10.577046), (-20.170357, 8.826619))
            ThreePointArc((-20.170357, 8.826619), (-19.926992, 8.554876), (-19.932992, 8.190137))
        make_face()
        with BuildLine():
            ThreePointArc((-13.037041, 20.796821), (-13.141482, 21.497114), (-13.445715, 22.136457))
            ThreePointArc((-13.445715, 22.136457), (-16.8675, 22.72394), (-17.295814, 19.278611))
            ThreePointArc((-17.295814, 19.278611), (-14.631142, 18.536174), (-13.037041, 20.796821))
        make_face()
        with BuildLine():
            ThreePointArc((-14.627597, -16.455574), (-14.29395, -16.308093), (-13.948917, -16.42651))
            ThreePointArc((-13.948917, -16.42651), (-15.866528, -14.582722), (-17.542358, -12.516717))
            ThreePointArc((-17.542358, -12.516717), (-17.453404, -12.870493), (-17.628446, -13.190541))
            Line((-17.628446, -13.190541), (-20.609731, -15.685948))
            ThreePointArc((-20.609731, -15.685948), (-18.053674, -15.351815), (-16.669284, -17.526335))
            ThreePointArc((-16.669284, -17.526335), (-16.850044, -18.440104), (-17.365096, -19.216229))
            Line((-17.365096, -19.216229), (-14.627597, -16.455574))
        make_face()
        with BuildLine():
            ThreePointArc((-12.447877, -22.71256), (-11.245759, -25.969653), (-8.04786, -24.617919))
            ThreePointArc((-8.04786, -24.617919), (-7.931328, -24.199675), (-7.892055, -23.76728))
            ThreePointArc((-7.892055, -23.76728), (-9.750747, -21.429121), (-12.447877, -22.71256))
        make_face()
        with BuildLine():
            ThreePointArc((-21.540923, -0.625415), (-21.453854, 2.033382), (-21.039861, 4.661194))
            ThreePointArc((-21.039861, 4.661194), (-21.243247, 4.358366), (-21.598216, 4.274294))
            Line((-21.598216, 4.274294), (-25.447533, 4.820067))
            ThreePointArc((-25.447533, 4.820067), (-23.972184, 4.01727), (-23.384446, 2.443833))
            ThreePointArc((-23.384446, 2.443833), (-24.128733, 0.706417), (-25.899958, 0.046614))
            Line((-25.899958, 0.046614), (-22.016647, -0.140506))
            ThreePointArc((-22.016647, -0.140506), (-21.683795, -0.289769), (-21.540923, -0.625415))
        make_face()
        with BuildLine():
            ThreePointArc((-20.161268, 12.720032), (-20.461471, 13.882295), (-21.286981, 14.753795))
            ThreePointArc((-21.286981, 14.753795), (-24.651887, 13.898722), (-23.641829, 10.577046))
            ThreePointArc((-23.641829, 10.577046), (-21.302965, 10.67634), (-20.161268, 12.720032))
        make_face()
        with BuildLine():
            ThreePointArc((-20.056059, -9.083336), (-19.691272, -9.084311), (-19.424233, -9.332828))
            ThreePointArc((-19.424233, -9.332828), (-20.426122, -6.868482), (-21.116748, -4.29947))
            ThreePointArc((-21.116748, -4.29947), (-21.179379, -4.658842), (-21.469464, -4.880024))
            Line((-21.469464, -4.880024), (-25.207976, -5.947094))
            ThreePointArc((-25.207976, -5.947094), (-23.103736, -6.339083), (-22.14926, -8.254927))
            ThreePointArc((-22.14926, -8.254927), (-22.568499, -9.610134), (-23.679749, -10.491878))
            Line((-23.679749, -10.491878), (-20.056059, -9.083336))
        make_face()
        with BuildLine():
            ThreePointArc((-20.609731, -15.685948), (-20.836322, -19.150397), (-17.365096, -19.216229))
            ThreePointArc((-17.365096, -19.216229), (-16.850044, -18.440104), (-16.669284, -17.526335))
            ThreePointArc((-16.669284, -17.526335), (-18.053674, -15.351815), (-20.609731, -15.685948))
        make_face()
        with BuildLine():
            ThreePointArc((-23.384446, 2.443833), (-23.972184, 4.01727), (-25.447533, 4.820067))
            ThreePointArc((-25.447533, 4.820067), (-28.173739, 2.670288), (-25.899958, 0.046614))
            ThreePointArc((-25.899958, 0.046614), (-24.128733, 0.706417), (-23.384446, 2.443833))
        make_face()
        with BuildLine():
            ThreePointArc((-25.207976, -5.947094), (-26.824095, -9.019862), (-23.679749, -10.491878))
            ThreePointArc((-23.679749, -10.491878), (-22.568499, -9.610134), (-22.14926, -8.254927))
            ThreePointArc((-22.14926, -8.254927), (-23.103736, -6.339083), (-25.207976, -5.947094))
        make_face()
    extrude(amount=F1_DEPTH)


solid = f1.part
